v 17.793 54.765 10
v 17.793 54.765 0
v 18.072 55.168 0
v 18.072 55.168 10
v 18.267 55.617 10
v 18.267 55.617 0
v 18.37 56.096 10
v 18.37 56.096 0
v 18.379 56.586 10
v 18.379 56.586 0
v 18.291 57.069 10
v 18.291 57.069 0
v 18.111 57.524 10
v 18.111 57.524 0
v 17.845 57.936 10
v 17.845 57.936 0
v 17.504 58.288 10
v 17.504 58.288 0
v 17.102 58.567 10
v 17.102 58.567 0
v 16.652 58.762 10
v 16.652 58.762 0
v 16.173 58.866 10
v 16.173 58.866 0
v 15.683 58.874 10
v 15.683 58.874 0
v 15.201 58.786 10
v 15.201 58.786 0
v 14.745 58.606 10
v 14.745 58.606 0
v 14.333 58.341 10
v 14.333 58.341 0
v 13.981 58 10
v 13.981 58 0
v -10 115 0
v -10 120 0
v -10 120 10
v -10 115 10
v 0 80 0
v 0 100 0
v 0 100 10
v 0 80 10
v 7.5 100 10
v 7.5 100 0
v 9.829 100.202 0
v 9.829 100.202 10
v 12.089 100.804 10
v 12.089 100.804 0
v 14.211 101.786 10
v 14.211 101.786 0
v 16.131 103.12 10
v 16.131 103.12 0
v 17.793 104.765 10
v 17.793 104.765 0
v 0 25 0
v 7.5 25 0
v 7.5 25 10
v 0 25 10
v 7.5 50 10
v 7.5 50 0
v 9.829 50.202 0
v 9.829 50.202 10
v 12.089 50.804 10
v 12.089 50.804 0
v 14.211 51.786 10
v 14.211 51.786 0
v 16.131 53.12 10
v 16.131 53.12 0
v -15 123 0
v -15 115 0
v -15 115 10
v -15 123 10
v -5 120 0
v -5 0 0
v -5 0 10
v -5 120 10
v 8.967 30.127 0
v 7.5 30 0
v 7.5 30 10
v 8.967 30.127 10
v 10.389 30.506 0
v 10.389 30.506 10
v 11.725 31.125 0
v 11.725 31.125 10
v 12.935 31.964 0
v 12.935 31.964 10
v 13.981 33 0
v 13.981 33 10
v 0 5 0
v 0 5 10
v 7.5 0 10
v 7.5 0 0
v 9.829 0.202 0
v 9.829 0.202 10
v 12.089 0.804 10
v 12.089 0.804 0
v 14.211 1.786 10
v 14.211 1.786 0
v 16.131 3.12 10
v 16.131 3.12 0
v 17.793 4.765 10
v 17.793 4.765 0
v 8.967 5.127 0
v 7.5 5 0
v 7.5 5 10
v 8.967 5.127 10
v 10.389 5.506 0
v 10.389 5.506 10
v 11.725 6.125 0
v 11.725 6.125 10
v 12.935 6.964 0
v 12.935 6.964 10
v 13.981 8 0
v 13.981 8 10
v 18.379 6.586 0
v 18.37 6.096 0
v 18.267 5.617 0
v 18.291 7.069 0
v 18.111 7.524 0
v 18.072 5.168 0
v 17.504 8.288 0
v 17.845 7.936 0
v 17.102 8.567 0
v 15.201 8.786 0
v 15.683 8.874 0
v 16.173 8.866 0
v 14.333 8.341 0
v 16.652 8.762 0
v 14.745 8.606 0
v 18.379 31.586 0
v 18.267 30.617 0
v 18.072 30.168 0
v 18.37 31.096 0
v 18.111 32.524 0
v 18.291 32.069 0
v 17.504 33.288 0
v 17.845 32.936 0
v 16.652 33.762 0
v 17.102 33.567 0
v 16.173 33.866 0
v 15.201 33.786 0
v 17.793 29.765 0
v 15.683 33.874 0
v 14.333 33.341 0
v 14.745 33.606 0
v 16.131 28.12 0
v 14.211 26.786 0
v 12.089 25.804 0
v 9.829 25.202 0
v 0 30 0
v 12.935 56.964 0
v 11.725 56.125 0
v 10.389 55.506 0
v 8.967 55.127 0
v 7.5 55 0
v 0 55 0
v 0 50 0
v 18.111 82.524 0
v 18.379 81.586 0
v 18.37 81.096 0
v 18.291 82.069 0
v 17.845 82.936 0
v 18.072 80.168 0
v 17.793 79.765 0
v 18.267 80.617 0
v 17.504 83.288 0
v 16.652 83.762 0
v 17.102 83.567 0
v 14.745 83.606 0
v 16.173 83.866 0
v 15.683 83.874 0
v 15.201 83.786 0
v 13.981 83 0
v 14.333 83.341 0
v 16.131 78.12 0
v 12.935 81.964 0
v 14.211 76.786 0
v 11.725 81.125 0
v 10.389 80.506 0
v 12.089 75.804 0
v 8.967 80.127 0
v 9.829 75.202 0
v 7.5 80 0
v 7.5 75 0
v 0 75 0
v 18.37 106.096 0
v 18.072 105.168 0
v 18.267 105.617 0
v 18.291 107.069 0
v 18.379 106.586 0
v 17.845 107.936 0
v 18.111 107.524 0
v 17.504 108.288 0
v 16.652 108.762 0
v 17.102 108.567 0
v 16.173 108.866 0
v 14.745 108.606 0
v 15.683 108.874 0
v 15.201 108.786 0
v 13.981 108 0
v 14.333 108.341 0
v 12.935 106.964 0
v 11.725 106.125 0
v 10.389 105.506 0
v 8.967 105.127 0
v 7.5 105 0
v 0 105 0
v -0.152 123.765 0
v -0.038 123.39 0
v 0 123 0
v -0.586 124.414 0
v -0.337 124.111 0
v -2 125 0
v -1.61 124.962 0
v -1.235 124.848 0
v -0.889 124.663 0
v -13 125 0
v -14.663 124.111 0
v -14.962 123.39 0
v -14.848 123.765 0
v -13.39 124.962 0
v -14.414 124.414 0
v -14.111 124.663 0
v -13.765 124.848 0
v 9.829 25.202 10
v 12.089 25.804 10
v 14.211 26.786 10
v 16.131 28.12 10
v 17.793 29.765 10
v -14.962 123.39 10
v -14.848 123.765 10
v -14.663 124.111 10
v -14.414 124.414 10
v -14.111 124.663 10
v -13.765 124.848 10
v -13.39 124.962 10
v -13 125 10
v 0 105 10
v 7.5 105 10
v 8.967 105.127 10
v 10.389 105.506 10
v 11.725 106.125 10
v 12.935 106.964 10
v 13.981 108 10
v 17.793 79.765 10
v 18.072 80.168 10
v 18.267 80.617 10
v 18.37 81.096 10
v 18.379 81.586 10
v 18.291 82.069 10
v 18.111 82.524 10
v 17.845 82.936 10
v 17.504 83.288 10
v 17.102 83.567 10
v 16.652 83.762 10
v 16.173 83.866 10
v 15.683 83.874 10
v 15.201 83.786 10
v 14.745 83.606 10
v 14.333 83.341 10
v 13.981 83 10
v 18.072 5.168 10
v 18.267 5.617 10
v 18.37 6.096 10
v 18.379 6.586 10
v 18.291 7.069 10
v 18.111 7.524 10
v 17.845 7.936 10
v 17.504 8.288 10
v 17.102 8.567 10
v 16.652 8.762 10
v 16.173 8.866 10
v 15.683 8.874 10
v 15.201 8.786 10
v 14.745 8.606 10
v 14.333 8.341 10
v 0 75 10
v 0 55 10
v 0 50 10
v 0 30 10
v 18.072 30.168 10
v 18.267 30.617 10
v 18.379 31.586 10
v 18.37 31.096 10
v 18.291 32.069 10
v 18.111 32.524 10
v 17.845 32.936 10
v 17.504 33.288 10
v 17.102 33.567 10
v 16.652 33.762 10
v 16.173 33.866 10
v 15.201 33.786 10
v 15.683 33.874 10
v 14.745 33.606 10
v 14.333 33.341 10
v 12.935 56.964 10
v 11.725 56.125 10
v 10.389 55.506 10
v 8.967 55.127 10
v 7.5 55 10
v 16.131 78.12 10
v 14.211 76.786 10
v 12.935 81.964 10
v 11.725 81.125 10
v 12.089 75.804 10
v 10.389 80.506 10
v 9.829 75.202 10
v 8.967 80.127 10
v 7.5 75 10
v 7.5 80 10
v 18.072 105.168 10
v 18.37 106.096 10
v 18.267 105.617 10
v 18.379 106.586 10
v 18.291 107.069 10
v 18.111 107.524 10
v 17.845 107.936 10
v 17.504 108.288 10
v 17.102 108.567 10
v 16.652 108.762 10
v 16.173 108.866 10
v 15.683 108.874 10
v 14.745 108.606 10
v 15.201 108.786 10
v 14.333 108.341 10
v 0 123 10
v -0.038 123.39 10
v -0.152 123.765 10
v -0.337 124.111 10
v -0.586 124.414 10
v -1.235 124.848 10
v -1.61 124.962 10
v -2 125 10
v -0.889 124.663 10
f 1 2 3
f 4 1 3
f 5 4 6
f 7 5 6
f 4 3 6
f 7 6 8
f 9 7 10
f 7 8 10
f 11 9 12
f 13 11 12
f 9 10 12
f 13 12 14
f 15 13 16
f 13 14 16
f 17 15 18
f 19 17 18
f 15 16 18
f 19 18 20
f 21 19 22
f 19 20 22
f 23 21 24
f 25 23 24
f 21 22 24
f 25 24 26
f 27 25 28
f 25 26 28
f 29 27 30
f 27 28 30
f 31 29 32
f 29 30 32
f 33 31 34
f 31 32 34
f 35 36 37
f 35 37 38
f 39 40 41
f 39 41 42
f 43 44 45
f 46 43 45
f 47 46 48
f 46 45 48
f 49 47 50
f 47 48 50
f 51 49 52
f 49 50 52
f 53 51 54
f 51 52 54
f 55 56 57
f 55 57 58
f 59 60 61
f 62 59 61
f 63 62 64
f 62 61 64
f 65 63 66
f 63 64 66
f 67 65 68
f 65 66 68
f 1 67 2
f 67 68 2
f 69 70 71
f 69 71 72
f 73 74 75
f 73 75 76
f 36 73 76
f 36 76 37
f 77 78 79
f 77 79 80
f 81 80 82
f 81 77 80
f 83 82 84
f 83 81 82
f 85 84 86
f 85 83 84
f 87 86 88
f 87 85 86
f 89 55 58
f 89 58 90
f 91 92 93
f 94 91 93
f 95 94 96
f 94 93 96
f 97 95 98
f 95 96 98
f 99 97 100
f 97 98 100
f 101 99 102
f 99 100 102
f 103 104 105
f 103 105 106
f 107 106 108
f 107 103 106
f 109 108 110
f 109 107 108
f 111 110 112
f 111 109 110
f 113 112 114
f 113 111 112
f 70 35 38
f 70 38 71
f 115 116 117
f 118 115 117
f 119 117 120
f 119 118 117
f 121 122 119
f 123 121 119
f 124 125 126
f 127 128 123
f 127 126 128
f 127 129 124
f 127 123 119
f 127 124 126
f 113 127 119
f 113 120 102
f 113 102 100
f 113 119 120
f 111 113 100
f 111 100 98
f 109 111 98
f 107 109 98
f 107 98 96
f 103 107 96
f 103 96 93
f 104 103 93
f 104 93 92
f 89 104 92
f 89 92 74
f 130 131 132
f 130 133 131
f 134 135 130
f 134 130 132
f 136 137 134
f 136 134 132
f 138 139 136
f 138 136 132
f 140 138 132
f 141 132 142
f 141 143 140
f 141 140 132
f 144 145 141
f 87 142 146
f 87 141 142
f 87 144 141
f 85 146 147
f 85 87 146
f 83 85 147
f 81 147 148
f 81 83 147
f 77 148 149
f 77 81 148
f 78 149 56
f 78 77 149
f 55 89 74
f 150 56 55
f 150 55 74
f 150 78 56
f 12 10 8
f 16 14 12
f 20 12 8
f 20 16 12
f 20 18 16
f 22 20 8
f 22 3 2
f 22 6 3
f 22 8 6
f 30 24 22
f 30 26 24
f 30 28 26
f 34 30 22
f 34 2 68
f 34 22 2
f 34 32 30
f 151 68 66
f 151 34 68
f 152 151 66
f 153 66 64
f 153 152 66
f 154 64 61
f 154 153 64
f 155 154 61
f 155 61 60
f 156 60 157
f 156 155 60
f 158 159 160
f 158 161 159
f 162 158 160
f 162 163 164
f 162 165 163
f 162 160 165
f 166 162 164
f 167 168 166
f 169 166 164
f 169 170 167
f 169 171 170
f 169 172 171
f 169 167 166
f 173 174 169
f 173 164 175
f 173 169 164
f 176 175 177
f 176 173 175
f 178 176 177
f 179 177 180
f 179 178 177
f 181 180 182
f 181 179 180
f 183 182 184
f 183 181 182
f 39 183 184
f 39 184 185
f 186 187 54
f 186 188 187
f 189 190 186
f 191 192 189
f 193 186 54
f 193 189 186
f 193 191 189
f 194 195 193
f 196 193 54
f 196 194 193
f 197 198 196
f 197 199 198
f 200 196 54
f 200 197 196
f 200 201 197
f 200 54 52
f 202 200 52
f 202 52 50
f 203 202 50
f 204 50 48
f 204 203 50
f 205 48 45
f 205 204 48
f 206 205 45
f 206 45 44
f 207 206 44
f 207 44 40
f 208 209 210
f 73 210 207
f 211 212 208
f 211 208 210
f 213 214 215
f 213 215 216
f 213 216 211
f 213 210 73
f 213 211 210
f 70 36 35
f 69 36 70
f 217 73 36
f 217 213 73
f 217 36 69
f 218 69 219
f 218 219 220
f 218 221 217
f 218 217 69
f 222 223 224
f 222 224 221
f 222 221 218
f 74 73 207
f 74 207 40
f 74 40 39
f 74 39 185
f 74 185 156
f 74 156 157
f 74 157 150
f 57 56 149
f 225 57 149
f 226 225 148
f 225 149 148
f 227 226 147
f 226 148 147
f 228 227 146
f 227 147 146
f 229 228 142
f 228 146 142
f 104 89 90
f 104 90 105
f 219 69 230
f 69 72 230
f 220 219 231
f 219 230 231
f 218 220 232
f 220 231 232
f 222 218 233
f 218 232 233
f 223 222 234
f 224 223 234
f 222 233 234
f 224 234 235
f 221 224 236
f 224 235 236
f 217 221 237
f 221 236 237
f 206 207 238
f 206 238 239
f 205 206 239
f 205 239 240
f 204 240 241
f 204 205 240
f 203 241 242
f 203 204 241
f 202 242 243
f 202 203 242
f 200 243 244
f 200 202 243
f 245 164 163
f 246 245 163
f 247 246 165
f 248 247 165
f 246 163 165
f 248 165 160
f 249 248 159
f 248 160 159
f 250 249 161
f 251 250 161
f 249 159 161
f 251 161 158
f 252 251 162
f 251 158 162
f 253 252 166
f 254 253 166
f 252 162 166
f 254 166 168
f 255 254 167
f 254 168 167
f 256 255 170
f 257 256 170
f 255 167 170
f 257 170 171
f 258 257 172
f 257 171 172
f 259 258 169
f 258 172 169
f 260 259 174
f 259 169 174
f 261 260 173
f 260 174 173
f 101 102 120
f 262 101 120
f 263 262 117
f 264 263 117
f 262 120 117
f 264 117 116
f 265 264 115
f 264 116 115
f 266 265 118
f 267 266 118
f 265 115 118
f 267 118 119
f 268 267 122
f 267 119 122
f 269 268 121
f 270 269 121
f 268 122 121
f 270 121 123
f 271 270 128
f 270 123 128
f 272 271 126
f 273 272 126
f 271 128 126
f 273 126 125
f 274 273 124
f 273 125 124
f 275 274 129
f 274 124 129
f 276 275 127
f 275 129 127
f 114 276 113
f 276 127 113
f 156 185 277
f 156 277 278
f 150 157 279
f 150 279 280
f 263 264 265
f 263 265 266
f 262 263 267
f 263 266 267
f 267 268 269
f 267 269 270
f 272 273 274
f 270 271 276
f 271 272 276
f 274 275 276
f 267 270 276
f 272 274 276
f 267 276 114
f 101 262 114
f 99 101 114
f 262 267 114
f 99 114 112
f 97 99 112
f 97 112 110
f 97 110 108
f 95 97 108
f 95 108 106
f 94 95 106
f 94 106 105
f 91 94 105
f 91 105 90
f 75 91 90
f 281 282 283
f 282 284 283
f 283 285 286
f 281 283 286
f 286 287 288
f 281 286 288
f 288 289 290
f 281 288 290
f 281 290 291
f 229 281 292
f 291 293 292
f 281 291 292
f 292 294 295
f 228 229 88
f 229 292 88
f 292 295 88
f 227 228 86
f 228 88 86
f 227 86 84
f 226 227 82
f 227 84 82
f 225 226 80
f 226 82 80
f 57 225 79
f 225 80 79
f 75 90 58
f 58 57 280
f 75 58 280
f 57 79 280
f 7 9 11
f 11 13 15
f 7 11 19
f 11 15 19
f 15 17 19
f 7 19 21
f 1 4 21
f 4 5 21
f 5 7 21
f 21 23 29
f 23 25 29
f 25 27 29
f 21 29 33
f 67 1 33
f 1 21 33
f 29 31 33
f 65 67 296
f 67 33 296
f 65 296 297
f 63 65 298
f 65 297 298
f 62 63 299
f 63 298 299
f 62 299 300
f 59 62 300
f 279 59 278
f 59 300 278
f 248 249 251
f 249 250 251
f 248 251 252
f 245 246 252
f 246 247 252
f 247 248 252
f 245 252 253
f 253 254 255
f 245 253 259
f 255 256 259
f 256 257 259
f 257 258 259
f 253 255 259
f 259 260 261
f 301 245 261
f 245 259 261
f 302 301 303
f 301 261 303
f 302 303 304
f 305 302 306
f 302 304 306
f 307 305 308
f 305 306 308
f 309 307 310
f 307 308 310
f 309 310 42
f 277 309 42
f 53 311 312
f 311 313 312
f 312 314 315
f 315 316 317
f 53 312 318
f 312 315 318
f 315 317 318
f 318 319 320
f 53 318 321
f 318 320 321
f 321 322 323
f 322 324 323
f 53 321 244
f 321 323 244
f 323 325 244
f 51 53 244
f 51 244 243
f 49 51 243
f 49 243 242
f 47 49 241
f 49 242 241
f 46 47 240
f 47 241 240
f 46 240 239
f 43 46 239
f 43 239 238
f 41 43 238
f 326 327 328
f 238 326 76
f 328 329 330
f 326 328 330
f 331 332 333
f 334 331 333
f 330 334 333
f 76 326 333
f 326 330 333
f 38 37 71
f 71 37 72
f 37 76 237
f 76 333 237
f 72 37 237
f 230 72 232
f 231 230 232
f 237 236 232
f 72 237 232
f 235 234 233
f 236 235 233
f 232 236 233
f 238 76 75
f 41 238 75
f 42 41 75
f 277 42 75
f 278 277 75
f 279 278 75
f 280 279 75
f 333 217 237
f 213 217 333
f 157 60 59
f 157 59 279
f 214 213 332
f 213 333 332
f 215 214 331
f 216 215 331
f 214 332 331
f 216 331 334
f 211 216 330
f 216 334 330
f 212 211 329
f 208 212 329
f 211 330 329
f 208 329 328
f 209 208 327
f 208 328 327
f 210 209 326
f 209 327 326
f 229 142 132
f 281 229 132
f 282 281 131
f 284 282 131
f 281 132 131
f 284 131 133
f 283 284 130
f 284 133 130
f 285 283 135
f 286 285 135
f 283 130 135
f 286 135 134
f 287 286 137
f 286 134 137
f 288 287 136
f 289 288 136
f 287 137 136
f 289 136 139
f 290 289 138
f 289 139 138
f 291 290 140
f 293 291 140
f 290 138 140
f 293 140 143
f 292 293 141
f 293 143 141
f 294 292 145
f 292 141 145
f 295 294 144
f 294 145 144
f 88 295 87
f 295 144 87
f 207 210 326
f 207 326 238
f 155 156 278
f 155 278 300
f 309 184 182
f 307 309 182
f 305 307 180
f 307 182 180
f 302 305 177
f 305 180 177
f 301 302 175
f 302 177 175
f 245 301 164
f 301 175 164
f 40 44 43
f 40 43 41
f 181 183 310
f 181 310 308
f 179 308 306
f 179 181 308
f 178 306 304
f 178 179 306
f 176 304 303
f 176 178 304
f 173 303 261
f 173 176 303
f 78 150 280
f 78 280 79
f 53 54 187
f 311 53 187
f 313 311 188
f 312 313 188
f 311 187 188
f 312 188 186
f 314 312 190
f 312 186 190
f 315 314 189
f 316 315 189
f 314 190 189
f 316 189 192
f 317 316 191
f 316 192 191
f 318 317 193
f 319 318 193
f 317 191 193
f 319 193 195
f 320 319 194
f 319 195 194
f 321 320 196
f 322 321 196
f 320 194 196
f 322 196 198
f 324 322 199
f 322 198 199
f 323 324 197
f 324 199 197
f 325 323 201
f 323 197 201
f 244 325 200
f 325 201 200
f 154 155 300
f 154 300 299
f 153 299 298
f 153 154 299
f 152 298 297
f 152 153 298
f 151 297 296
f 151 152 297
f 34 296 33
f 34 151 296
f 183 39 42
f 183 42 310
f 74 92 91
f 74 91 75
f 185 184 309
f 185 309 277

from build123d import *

# Parameters (mm, degrees)
PAD_DEPTH           = 10
PAD001_DEPTH        = 10
LINEARPATTERN_COUNT = 5
LINEARPATTERN_PITCH = 25
FILLET_R            = 2


with BuildPart() as part:
    # Sketch → Pad (new body)
    with BuildSketch(Plane.XY):
        Polygon((-5, 0), (-5, 120), (-10, 120), (-10, 115), (-15, 115), (-15, 125), (0, 125), (0, 0), align=None)
    extrude(amount=PAD_DEPTH)

    # Sketch001 → Pad001 (join)
    with BuildSketch(Plane.XY):
        with BuildLine():
            Line((0, 0), (0, 5))
            Line((0, 5), (7.5, 5))
            ThreePointArc((7.5, 5), (11.070714, 5.786376), (13.980741, 8))
            ThreePointArc((17.792941, 4.764706), (17.504488, 8.288453), (13.980741, 8))
            ThreePointArc((7.5, 0), (13.171134, 1.24895), (17.792941, 4.764706))
            Line((7.5, 0), (0, 0))
        make_face()
    pad001 = extrude(amount=PAD001_DEPTH)

    # LinearPattern: Pad001 ×5
    with Locations(*[(0, i * LINEARPATTERN_PITCH, 0) for i in range(1, LINEARPATTERN_COUNT)]):
        add(pad001)

    # Fillet
    fillet_edges = [part.edges().sort_by_distance(p)[0] for p in [
        (0, 125, 5),
        (-15, 125, 5),
    ]]
    fillet(fillet_edges, radius=FILLET_R)


solid = part.part
